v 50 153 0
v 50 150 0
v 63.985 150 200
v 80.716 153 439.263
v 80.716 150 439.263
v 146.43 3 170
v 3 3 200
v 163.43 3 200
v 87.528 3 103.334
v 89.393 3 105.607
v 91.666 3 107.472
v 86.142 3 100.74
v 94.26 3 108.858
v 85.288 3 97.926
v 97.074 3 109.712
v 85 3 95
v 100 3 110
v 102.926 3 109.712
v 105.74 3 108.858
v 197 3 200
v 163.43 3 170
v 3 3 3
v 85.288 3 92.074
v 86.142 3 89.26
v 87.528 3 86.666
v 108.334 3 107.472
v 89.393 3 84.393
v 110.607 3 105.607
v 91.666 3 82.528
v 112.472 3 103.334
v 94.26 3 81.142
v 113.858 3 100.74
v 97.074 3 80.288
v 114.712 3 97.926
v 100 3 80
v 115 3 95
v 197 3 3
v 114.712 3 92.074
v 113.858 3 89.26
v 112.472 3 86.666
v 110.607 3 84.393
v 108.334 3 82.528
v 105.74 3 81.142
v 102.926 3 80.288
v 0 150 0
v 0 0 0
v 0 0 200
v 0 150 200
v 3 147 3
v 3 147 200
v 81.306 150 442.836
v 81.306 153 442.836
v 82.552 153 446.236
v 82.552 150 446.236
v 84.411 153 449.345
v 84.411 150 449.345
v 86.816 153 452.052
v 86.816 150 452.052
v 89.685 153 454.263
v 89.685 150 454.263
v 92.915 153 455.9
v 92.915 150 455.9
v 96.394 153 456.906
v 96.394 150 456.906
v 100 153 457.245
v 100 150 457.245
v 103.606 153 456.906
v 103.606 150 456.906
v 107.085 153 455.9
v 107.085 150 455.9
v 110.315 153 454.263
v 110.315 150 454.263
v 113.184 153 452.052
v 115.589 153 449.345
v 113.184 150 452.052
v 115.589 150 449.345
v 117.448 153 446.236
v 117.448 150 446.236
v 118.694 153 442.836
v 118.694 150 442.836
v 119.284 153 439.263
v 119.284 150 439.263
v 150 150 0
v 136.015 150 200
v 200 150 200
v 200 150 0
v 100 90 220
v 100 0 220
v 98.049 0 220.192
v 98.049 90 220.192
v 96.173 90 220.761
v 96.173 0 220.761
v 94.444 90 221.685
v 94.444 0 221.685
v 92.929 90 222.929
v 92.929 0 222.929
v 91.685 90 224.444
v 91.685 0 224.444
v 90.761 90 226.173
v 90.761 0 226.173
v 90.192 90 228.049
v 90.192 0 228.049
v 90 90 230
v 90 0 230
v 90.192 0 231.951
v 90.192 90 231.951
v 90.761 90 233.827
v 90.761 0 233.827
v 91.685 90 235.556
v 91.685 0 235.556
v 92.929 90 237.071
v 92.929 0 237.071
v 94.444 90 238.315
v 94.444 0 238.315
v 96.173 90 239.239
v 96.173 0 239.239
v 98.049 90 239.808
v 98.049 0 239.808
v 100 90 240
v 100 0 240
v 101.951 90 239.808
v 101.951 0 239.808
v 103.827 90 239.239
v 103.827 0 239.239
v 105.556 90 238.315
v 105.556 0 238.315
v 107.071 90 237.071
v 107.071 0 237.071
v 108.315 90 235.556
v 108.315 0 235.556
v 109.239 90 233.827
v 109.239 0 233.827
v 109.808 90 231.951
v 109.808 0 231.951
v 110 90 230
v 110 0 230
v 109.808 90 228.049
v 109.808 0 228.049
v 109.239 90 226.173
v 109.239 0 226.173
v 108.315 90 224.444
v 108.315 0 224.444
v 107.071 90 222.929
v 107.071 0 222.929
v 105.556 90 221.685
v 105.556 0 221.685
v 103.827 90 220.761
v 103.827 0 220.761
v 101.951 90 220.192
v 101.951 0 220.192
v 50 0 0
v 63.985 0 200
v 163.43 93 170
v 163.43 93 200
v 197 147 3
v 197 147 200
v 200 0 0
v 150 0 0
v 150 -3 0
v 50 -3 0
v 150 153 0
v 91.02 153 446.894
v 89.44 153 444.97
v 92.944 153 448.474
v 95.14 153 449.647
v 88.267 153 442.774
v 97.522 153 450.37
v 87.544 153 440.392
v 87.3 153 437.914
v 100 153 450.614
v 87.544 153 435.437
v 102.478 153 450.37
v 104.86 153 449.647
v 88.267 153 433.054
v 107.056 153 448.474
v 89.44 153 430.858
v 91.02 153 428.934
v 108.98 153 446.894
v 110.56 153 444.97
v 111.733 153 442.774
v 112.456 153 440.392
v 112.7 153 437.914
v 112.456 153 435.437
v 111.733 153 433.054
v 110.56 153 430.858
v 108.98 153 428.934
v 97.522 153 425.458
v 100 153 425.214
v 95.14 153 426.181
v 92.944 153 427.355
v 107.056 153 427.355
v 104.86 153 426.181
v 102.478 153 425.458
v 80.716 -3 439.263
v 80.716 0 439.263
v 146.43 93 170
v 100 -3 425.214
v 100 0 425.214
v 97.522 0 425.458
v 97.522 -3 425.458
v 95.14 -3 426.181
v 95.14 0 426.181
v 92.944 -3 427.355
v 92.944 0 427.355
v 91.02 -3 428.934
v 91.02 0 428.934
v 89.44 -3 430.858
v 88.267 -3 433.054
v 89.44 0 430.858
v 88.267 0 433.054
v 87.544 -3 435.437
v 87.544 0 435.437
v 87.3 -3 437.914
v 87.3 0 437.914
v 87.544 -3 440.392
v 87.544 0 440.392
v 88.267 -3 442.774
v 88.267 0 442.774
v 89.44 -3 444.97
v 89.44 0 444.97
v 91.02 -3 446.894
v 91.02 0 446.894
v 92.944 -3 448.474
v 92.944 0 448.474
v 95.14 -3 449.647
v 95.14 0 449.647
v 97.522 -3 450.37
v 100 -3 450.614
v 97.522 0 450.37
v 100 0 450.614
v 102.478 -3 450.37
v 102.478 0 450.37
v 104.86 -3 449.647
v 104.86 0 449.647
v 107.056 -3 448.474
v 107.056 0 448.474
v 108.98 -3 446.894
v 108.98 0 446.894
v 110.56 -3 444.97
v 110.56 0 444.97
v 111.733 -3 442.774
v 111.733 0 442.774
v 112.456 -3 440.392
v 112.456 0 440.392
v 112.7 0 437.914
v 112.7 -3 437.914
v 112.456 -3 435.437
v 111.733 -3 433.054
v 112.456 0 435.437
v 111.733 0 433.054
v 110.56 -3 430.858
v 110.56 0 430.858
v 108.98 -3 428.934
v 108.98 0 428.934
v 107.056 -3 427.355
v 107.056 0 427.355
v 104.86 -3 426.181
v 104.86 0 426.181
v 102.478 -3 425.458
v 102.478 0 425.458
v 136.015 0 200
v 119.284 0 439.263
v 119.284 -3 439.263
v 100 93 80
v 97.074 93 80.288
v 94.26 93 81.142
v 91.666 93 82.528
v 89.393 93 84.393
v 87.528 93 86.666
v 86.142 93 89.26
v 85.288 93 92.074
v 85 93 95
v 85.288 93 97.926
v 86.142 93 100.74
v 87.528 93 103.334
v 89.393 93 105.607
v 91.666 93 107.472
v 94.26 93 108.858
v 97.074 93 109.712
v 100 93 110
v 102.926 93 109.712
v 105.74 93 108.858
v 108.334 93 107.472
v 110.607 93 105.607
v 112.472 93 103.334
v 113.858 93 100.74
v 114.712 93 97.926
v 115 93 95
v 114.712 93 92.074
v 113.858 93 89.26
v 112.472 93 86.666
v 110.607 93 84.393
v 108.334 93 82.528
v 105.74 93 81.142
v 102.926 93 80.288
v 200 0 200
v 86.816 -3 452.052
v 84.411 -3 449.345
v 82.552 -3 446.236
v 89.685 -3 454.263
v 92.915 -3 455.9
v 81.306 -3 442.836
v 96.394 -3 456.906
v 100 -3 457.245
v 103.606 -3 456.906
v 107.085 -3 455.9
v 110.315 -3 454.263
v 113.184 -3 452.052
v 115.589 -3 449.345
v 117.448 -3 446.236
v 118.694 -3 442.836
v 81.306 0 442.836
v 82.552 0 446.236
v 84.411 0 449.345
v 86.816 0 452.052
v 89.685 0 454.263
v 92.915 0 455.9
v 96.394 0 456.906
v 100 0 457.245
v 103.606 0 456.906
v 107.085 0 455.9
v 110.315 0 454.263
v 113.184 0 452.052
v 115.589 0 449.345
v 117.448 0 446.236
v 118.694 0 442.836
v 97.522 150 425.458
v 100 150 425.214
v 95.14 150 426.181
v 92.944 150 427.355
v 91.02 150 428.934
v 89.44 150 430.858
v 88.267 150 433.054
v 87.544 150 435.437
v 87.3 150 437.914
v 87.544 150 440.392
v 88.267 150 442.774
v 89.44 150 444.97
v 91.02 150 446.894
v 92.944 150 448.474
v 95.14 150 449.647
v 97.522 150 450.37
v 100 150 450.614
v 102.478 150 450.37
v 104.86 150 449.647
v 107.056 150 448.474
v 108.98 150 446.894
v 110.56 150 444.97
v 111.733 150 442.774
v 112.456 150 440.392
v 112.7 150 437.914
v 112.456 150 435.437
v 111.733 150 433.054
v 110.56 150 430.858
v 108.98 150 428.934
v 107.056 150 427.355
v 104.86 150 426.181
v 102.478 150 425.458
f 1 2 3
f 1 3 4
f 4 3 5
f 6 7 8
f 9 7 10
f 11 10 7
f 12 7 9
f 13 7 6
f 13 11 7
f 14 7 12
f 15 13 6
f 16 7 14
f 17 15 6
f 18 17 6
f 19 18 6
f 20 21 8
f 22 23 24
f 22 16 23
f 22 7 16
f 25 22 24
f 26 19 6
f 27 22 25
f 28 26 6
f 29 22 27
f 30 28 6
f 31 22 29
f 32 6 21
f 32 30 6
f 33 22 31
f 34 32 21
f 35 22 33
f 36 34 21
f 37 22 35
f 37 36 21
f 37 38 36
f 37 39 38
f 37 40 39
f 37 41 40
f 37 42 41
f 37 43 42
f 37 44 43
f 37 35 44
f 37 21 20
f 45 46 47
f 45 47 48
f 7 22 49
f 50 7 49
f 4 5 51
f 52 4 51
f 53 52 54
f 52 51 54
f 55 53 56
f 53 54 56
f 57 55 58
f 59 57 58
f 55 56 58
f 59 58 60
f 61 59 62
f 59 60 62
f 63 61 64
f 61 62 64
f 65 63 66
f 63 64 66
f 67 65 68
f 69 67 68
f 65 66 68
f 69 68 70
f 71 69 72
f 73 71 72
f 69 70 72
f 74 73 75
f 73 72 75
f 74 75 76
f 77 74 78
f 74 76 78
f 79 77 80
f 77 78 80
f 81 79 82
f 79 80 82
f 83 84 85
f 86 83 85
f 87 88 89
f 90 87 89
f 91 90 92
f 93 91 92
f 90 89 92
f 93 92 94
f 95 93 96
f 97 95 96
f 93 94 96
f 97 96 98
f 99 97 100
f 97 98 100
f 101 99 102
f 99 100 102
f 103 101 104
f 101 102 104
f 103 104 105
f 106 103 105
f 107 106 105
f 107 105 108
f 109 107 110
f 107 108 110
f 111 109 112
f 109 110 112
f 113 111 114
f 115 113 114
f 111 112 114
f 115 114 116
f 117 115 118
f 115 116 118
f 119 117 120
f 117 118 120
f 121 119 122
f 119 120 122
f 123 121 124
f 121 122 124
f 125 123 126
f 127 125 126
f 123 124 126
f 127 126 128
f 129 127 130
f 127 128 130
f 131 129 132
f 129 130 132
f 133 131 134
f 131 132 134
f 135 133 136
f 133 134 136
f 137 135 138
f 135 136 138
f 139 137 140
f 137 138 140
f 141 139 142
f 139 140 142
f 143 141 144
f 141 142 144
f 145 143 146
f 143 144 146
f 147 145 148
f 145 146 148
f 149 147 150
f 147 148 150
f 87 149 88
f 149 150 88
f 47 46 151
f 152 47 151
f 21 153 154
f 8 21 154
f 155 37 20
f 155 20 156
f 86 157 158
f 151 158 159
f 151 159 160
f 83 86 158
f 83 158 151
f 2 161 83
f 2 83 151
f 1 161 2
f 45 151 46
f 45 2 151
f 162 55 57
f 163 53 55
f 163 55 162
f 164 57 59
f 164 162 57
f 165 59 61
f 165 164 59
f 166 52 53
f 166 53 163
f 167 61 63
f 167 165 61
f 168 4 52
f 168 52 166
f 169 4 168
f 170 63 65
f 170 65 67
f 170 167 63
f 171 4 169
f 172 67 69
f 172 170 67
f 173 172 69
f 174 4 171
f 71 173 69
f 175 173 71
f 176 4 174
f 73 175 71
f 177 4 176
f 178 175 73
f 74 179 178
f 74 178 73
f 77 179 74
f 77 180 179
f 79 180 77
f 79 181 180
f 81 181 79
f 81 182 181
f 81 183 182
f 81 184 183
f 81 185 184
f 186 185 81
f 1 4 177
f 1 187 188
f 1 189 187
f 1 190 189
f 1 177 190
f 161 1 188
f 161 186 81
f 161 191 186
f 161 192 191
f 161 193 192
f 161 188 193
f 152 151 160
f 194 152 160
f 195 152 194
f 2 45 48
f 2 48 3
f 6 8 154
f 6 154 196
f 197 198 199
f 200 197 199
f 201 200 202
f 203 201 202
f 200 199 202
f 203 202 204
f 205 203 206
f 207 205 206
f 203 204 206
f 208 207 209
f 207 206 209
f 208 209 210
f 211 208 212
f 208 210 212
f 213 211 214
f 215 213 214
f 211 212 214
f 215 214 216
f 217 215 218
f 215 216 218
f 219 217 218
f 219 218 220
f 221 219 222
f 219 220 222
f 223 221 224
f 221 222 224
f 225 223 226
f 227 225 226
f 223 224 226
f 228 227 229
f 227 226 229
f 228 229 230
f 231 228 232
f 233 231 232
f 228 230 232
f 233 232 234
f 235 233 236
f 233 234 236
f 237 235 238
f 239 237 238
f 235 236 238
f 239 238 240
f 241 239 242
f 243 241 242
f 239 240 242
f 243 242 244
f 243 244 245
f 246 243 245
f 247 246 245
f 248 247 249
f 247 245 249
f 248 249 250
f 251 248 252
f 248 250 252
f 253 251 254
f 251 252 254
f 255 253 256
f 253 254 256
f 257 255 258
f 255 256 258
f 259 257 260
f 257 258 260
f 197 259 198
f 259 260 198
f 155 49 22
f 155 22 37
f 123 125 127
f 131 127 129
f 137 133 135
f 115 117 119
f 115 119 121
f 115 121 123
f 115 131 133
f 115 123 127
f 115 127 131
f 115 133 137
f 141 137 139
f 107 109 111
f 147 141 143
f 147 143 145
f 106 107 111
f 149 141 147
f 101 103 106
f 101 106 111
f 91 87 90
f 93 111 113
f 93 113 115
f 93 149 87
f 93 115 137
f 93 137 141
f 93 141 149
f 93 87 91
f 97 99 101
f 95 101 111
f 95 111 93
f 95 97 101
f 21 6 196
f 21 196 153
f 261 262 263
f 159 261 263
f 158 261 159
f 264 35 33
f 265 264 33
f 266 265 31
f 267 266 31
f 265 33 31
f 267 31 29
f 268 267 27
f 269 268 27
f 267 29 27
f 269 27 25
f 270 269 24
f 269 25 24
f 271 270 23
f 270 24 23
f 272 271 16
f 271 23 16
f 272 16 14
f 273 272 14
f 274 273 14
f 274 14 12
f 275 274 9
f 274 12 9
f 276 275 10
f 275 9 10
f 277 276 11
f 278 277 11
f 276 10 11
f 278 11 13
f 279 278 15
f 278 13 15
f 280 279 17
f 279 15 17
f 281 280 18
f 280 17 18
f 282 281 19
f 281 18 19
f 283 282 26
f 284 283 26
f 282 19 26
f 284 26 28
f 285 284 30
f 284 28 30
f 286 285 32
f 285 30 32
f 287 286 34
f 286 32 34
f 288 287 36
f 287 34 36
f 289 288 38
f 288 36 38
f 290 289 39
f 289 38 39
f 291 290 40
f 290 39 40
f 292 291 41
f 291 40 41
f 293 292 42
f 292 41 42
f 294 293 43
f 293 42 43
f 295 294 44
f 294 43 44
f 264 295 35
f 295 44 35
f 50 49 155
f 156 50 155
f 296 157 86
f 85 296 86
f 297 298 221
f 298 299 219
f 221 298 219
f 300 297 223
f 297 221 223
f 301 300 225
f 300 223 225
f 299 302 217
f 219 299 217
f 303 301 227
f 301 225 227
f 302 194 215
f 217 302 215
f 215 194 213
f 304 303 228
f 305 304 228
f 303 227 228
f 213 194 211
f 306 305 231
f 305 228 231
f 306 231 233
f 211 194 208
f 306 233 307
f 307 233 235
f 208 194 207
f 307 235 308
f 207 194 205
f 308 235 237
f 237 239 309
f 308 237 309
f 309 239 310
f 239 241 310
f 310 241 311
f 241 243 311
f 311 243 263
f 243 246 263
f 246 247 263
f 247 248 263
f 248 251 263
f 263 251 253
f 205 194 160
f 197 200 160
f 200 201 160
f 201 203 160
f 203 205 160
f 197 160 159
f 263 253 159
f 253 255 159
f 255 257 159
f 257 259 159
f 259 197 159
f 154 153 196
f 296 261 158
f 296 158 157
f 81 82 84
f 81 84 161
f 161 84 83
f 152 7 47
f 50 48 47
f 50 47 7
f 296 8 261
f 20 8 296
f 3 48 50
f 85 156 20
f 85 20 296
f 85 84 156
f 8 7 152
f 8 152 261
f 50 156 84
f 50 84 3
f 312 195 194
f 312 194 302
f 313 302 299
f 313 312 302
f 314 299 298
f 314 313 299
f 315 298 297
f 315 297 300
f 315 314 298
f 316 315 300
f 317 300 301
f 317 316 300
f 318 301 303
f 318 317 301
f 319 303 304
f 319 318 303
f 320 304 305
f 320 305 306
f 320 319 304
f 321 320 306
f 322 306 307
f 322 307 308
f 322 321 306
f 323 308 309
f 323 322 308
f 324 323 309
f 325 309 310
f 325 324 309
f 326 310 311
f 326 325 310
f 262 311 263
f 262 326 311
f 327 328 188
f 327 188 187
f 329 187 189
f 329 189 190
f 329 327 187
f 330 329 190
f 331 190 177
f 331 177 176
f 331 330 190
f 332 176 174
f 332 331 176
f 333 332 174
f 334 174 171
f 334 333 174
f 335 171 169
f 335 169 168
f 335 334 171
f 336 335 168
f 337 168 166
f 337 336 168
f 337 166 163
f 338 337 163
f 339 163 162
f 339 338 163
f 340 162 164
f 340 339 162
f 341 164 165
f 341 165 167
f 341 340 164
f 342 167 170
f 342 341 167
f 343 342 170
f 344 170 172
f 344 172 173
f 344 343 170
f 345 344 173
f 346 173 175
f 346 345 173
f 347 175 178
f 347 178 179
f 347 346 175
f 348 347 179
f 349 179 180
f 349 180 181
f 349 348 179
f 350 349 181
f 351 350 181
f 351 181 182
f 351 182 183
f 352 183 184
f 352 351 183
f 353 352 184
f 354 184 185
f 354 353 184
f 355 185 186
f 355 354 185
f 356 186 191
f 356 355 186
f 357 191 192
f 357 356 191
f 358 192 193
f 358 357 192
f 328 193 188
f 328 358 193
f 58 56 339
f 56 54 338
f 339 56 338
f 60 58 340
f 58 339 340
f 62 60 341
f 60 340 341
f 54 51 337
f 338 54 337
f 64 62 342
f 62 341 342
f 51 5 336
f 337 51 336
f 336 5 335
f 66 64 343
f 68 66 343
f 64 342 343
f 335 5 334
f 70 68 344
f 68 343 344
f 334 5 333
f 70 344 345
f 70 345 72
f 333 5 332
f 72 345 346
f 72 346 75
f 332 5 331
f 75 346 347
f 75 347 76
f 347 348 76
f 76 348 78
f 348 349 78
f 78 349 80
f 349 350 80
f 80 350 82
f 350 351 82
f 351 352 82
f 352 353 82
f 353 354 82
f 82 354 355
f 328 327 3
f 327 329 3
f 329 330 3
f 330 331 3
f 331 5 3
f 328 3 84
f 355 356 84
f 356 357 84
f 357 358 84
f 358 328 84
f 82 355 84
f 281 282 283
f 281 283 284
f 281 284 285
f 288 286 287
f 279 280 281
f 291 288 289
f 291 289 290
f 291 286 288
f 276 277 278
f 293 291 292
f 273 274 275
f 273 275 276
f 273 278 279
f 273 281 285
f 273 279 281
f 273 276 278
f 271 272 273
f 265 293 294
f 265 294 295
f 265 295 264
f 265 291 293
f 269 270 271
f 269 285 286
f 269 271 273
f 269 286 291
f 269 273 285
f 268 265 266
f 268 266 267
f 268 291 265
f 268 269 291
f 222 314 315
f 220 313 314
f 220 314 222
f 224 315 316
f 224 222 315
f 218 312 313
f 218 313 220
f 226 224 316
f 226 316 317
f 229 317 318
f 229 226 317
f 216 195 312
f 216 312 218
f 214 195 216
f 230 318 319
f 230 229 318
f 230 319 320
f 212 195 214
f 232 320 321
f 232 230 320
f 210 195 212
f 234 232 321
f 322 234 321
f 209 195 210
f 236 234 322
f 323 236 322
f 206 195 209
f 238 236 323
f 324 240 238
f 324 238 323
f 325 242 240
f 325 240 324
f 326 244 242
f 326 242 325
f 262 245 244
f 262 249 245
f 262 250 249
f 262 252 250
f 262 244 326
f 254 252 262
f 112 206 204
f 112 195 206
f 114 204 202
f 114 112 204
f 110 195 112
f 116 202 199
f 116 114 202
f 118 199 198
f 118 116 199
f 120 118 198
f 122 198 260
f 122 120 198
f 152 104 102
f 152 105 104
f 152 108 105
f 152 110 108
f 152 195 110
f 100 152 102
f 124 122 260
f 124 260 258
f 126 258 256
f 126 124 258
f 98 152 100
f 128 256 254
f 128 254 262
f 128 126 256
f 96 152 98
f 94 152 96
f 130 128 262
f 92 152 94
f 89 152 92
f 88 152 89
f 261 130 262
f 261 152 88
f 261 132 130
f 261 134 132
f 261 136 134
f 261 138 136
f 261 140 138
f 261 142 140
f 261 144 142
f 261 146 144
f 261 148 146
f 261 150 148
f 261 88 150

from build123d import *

# Parameters (mm, degrees)
CROQUIS1_W              = 200
CROQUIS1_H              = 150
SALIENTE_EXTRUIR1_DEPTH = 200
VACIADO1_T              = -3
CROQUIS2_R              = 12.7
SALIENTE_EXTRUIR2_DEPTH = 3
CROQUIS4_R              = 15
SALIENTE_EXTRUIR3_DEPTH = 90
CROQUIS6_R              = 10
SALIENTE_EXTRUIR4_DEPTH = 90
SALIENTE_EXTRUIR5_DEPTH = 90


with BuildPart() as part:
    # Croquis1 → Saliente-Extruir1 (new body)
    with BuildSketch(Plane.XY):
        with Locations((100, 75)):
            Rectangle(CROQUIS1_W, CROQUIS1_H)
    extrude(amount=SALIENTE_EXTRUIR1_DEPTH)

    # Vaciado1
    vaciado1_openings = [part.faces().sort_by_distance(p)[0] for p in [
        (100, 75, 200),
    ]]
    offset(amount=VACIADO1_T, openings=vaciado1_openings, kind=Kind.INTERSECTION)

    # Croquis2 → Saliente-Extruir2 (add)
    with BuildSketch(Plane(origin=(0, 150, 0), x_dir=(1, 0, 0), z_dir=(0, 1, 0))):
        with BuildLine():
            Line((150, 0), (50, 0))
            Line((50, 0), (80.716237825, -439.262665799))
            ThreePointArc((80.716237825, -439.262665799), (100, -457.245064944), (119.283762175, -439.262665799))
            Line((119.283762175, -439.262665799), (150, 0))
        make_face()
        with Locations(Location((100, -437.914213787, 0), (0, 0, 90))):
            Circle(CROQUIS2_R, mode=Mode.SUBTRACT)
    saliente_extruir2 = extrude(amount=SALIENTE_EXTRUIR2_DEPTH)

    # Simetría1: Saliente-Extruir2 across plane
    add(saliente_extruir2.mirror(Plane(origin=(0, 75, 0), x_dir=(0, 0, 1), z_dir=(0, -1, 0))))

    # Croquis4 → Saliente-Extruir3 (add)
    with BuildSketch(Plane(origin=(0, 3, 0), x_dir=(1, 0, 0), z_dir=(0, 1, 0))):
        with Locations(Location((100, -95, 0), (0, 0, 90))):
            Circle(CROQUIS4_R)
    extrude(amount=SALIENTE_EXTRUIR3_DEPTH)

    # Croquis6 → Saliente-Extruir4 (add)
    with BuildSketch(Plane(origin=(0, 0, 0), x_dir=(1, 0, 0), z_dir=(0, 1, 0))):
        with Locations(Location((100, -230, 0), (0, 0, 90))):
            Circle(CROQUIS6_R)
    extrude(amount=SALIENTE_EXTRUIR4_DEPTH)

    # Croquis7 → Saliente-Extruir5 (add)
    with BuildSketch(Plane(origin=(0, 3, 0), x_dir=(1, 0, 0), z_dir=(0, 1, 0))):
        Polygon((146.429598438, -170), (163.429598438, -170), (163.429598438, -200), align=None)
    extrude(amount=SALIENTE_EXTRUIR5_DEPTH)


solid = part.part
